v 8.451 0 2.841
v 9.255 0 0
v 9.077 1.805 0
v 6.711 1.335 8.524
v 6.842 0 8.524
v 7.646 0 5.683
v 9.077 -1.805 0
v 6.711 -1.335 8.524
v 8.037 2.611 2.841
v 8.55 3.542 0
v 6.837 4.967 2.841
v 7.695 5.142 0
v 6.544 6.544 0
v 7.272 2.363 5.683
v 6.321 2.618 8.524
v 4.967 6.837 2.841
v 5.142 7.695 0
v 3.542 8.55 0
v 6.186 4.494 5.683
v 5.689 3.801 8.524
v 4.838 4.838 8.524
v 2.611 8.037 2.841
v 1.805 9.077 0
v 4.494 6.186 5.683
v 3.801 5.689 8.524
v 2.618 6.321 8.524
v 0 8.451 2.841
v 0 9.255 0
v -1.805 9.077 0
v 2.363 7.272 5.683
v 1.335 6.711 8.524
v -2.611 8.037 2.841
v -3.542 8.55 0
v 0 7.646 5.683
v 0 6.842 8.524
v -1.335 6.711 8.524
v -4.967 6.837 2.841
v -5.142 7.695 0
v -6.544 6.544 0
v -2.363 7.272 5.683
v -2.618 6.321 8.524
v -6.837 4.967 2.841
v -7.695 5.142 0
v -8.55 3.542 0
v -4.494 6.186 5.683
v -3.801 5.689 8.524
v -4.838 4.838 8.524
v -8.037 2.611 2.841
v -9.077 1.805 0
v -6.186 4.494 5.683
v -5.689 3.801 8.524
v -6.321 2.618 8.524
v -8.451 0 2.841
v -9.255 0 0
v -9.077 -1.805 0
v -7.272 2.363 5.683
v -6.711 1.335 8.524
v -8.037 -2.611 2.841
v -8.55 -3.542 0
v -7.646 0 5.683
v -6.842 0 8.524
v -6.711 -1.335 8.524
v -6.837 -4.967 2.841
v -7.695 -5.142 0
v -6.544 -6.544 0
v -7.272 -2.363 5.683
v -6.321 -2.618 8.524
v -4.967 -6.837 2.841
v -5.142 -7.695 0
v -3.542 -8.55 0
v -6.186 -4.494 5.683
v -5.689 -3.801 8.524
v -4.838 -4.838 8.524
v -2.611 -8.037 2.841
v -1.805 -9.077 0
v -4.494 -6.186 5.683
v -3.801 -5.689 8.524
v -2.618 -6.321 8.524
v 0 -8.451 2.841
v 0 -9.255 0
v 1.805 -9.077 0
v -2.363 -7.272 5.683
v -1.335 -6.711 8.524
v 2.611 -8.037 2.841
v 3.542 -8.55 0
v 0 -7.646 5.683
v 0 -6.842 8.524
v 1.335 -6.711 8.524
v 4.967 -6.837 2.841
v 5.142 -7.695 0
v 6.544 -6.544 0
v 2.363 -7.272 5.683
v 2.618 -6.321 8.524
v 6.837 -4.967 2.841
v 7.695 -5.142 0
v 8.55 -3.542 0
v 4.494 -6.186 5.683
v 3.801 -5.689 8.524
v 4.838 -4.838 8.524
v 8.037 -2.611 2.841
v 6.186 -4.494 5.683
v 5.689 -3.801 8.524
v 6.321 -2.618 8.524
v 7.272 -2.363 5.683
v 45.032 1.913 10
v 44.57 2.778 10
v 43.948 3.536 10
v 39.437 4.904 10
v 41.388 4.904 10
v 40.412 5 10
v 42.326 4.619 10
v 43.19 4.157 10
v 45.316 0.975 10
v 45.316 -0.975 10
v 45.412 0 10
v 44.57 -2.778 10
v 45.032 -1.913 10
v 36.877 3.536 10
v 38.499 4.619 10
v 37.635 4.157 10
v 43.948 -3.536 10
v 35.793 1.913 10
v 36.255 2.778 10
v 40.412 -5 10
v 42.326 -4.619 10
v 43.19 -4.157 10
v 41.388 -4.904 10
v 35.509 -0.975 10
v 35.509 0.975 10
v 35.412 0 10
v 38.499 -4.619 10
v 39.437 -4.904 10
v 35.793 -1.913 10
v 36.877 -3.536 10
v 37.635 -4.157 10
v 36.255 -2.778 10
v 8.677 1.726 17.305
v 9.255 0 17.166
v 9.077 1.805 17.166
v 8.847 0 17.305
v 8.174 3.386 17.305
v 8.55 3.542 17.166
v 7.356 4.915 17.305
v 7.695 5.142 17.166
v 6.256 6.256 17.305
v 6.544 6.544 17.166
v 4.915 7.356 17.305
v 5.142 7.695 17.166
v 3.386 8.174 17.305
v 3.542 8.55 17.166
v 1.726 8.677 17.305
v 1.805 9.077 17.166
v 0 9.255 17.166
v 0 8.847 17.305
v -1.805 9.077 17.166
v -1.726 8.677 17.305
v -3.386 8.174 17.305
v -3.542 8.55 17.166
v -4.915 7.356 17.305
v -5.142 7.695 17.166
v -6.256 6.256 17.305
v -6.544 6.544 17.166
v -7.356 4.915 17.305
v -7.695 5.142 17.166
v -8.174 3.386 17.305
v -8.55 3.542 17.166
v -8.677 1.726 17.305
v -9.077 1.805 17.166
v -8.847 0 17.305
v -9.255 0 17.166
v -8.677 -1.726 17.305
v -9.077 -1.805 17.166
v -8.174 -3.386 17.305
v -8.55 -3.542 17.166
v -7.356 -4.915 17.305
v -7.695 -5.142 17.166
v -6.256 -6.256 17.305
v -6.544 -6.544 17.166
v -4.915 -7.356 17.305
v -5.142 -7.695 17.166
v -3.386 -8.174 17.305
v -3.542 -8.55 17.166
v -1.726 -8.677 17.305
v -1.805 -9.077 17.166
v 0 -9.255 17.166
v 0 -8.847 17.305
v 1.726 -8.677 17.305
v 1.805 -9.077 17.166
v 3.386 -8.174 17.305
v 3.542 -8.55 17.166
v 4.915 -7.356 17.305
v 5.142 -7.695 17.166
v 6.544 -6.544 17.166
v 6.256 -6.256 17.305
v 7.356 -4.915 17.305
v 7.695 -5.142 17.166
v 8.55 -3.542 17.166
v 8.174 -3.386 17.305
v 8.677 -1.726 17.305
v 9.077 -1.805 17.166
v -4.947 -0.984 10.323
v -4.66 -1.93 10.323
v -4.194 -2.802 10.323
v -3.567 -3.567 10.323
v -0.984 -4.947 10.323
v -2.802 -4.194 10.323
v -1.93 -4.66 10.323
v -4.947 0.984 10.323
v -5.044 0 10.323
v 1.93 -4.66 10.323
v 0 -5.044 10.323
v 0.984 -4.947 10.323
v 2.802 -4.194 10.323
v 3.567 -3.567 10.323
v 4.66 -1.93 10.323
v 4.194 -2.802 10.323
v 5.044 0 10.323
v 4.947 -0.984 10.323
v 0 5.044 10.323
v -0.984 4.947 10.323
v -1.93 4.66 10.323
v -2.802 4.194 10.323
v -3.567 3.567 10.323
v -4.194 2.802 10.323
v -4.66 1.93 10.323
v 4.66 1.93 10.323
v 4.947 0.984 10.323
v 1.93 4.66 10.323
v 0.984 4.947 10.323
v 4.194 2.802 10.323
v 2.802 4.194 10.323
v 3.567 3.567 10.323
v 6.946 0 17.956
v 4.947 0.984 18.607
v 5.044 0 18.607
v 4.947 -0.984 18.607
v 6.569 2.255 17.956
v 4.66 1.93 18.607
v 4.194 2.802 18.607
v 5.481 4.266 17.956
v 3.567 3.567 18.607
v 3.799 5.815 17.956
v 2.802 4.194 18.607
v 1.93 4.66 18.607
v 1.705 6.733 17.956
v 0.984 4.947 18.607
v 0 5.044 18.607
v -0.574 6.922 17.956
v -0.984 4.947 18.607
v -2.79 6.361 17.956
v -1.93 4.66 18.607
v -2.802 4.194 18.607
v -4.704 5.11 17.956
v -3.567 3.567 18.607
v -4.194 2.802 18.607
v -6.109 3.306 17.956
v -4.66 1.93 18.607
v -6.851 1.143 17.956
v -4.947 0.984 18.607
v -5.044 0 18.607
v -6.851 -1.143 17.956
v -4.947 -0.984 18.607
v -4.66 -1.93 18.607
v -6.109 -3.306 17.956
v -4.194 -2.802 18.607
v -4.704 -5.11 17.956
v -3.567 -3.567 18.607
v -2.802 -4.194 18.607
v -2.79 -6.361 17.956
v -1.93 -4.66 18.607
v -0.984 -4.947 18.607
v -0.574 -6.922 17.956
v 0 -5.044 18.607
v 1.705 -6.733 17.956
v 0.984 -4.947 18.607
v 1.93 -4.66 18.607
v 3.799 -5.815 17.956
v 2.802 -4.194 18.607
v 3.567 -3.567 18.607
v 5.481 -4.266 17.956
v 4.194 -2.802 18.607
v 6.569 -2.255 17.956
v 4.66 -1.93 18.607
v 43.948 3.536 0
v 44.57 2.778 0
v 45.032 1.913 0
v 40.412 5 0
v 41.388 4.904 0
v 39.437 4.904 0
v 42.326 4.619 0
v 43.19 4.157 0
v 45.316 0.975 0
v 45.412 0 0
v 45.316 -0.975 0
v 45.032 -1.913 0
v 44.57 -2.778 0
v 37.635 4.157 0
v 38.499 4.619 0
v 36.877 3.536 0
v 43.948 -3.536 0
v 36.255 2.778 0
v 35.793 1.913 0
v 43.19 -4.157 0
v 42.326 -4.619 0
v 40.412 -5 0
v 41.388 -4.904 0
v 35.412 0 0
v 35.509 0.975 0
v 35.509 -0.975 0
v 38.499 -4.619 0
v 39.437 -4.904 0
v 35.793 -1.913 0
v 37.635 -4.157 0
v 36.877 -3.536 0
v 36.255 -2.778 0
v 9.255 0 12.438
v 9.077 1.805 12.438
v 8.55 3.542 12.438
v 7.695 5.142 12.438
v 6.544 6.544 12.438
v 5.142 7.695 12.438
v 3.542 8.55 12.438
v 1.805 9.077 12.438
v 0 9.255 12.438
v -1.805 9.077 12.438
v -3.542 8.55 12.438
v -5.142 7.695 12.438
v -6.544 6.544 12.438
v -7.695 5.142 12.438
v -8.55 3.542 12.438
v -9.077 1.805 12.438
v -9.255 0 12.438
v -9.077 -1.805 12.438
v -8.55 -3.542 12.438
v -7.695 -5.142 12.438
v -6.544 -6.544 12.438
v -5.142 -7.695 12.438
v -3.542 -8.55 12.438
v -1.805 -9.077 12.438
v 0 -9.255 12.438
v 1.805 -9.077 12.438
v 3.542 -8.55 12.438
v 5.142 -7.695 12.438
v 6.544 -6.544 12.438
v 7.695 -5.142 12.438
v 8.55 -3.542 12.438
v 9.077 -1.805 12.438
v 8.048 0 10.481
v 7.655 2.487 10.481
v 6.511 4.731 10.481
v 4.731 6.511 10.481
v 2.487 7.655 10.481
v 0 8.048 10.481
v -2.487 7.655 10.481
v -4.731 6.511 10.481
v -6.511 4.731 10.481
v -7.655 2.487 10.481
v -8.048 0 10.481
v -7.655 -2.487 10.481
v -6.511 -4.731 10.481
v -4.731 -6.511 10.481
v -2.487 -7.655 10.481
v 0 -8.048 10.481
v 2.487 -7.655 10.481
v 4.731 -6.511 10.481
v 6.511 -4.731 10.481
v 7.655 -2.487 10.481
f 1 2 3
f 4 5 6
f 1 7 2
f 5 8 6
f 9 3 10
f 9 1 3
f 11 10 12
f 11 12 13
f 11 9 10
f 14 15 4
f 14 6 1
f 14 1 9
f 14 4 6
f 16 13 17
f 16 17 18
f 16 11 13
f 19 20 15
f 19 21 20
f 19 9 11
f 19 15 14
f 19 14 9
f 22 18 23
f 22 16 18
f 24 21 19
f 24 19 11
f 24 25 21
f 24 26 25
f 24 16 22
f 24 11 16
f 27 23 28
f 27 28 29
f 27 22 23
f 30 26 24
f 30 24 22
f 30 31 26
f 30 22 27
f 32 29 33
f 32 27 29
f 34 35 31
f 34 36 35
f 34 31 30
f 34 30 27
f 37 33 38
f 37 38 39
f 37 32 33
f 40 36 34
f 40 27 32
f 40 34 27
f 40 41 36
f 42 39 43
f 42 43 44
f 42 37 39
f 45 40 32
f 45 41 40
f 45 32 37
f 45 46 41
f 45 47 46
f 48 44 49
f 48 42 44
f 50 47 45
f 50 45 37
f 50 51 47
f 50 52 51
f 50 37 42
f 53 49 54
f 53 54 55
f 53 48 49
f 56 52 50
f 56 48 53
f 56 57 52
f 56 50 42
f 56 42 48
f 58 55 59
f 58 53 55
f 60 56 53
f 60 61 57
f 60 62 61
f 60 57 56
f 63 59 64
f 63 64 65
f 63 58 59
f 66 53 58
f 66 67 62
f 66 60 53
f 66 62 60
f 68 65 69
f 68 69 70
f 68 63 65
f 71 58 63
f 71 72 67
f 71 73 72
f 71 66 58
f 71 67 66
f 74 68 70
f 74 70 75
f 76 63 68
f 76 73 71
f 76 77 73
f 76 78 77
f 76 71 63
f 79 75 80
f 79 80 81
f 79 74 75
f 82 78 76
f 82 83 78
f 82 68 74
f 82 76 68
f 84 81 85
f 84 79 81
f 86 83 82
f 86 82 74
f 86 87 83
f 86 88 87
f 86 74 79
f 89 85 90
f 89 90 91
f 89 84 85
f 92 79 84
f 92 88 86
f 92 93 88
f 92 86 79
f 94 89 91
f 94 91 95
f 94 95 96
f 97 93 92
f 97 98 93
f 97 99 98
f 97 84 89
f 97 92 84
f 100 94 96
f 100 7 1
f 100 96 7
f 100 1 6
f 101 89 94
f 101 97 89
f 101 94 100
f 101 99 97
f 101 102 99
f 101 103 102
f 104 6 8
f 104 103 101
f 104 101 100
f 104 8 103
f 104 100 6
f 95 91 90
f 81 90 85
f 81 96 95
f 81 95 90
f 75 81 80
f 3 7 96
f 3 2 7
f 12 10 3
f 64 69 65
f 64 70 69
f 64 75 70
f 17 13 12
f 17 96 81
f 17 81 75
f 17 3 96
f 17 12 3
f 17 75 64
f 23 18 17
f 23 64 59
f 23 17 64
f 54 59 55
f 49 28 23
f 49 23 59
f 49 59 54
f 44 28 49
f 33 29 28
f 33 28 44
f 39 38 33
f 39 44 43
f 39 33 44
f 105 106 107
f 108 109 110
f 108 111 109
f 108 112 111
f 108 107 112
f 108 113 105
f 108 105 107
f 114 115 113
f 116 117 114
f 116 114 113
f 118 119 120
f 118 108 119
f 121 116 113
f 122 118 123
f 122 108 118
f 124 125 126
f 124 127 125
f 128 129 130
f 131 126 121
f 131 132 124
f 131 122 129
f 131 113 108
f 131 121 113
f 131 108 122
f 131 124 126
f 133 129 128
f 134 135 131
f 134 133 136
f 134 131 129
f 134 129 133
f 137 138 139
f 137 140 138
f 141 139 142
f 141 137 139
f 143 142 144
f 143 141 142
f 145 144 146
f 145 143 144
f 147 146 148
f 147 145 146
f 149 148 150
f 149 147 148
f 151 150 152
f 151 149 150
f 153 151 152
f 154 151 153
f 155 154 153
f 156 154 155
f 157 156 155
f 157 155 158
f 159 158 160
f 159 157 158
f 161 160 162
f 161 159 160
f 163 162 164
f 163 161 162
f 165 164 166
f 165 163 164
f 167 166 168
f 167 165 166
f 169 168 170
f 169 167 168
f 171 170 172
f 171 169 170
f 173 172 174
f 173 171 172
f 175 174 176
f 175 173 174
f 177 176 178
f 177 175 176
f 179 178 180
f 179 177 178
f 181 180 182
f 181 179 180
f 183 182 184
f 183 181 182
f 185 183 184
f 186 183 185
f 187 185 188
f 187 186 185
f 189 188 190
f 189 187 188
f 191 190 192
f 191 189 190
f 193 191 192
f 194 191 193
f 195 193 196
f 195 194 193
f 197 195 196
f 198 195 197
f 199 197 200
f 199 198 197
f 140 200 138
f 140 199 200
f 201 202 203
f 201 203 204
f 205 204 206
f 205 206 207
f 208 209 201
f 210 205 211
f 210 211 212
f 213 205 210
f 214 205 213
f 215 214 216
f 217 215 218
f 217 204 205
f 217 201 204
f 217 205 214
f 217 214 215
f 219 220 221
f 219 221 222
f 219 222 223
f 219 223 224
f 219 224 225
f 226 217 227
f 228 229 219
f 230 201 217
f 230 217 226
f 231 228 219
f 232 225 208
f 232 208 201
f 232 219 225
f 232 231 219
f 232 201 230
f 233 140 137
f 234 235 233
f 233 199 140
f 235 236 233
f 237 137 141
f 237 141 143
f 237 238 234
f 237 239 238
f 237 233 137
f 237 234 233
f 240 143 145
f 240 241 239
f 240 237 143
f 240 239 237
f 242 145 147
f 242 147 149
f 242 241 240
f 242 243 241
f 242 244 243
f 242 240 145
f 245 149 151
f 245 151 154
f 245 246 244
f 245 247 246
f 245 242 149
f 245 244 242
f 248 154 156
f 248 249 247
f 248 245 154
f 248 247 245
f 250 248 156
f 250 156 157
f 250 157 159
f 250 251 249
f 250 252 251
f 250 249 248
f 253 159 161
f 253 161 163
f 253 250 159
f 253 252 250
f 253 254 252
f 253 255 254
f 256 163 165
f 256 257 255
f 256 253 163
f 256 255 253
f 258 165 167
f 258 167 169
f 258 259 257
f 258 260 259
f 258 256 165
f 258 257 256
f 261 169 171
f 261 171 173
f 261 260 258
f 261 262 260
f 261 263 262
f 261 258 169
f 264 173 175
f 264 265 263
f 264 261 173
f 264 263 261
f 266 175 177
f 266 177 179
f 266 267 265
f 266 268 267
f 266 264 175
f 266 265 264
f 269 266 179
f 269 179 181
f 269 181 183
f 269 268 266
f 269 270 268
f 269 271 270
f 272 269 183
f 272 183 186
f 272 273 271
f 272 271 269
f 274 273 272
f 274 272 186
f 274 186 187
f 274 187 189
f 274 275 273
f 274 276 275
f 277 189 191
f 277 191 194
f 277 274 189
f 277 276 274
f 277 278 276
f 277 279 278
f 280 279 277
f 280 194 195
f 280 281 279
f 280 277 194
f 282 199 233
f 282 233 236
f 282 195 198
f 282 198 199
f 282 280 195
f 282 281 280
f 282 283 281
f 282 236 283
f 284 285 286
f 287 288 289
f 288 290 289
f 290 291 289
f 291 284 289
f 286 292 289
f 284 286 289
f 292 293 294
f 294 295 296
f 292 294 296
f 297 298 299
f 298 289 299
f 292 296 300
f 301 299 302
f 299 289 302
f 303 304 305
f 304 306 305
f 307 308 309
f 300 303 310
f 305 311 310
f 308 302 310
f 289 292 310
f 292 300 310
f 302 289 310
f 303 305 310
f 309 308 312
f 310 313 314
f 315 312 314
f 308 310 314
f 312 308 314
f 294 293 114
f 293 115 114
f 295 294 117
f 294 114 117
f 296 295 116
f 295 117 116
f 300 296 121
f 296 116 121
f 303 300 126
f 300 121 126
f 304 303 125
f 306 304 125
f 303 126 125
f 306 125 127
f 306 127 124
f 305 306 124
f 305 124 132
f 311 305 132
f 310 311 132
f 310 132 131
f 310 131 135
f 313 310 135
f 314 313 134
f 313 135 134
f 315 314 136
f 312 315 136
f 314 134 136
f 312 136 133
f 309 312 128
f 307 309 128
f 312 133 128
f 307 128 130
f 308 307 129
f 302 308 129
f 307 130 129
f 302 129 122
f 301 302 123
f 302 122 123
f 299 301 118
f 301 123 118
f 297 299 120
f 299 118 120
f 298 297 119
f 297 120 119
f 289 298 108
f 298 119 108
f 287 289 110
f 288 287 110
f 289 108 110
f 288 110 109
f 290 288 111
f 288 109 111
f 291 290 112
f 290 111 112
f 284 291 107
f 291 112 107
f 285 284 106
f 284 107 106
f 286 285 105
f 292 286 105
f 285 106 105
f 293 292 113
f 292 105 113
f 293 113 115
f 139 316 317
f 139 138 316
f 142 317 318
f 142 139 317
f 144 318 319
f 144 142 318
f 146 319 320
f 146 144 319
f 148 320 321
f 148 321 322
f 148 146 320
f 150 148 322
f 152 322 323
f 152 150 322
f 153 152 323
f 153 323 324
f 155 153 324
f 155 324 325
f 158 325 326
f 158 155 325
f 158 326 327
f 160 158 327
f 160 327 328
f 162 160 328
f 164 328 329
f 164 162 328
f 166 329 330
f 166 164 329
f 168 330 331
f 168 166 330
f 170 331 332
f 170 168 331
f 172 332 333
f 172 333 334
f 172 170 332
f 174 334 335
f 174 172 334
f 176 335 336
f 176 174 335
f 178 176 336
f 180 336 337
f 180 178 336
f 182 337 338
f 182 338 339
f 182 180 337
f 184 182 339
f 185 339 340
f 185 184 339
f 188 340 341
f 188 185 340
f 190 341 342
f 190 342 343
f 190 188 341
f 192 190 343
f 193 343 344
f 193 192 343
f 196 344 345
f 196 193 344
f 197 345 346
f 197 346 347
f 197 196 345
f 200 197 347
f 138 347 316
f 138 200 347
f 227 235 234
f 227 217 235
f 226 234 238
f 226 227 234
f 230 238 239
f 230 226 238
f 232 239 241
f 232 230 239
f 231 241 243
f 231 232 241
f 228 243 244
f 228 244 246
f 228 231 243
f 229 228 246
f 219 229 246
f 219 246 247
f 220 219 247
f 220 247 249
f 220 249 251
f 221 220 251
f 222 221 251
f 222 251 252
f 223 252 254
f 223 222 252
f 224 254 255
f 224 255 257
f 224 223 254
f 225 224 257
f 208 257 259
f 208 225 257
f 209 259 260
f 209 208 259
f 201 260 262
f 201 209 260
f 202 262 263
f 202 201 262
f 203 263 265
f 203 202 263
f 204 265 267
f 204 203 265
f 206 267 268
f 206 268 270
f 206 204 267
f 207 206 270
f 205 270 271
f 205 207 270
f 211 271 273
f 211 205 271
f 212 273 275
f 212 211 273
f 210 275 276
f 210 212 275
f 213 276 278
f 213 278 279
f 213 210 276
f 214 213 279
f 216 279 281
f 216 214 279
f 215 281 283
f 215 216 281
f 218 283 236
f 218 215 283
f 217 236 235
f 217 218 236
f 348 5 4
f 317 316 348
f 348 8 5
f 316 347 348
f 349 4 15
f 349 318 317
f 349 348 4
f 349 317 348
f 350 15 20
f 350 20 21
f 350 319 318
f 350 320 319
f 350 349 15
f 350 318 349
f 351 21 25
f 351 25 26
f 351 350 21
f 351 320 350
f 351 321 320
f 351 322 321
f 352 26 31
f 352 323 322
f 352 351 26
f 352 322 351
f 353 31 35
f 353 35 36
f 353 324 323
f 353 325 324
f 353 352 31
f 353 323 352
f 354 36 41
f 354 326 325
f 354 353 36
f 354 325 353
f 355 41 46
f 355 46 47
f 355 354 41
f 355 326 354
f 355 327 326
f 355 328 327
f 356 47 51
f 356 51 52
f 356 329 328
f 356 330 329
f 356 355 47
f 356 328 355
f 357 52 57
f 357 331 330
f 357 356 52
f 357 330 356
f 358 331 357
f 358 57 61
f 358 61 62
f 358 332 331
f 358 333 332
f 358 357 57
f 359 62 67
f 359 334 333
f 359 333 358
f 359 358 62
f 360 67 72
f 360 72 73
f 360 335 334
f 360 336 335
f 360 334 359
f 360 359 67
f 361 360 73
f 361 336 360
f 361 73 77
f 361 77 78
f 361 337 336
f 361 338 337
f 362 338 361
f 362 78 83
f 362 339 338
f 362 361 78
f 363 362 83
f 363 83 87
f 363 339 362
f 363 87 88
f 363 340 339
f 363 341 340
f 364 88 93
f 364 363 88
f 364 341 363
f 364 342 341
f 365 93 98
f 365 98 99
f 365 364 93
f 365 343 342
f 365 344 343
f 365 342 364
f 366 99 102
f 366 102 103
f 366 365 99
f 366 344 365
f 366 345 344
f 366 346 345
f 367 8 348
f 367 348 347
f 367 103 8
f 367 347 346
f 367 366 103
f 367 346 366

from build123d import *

# Parameters (mm, degrees)
F0_W = 5
F0_H = 10


# Not quite as in the source:
# - a feature names something its author has since deleted; it is built from what else it names


with BuildPart() as f1:
    # F0 (on Front) → F1 (revolve)
    with BuildSketch(Plane.XZ):
        Polygon((0, 10.3233849324), (0, 0), (9.254683698, 0), (6.8422881923, 8.5244880731), (9.254683698, 12.4379033223), (9.254683698, 14.0870045941), (9.254683698, 17.1659647299), (8.8474118947, 17.3053085763), (5.0441742836, 18.6065470946), (5.0441742836, 11.2733849324), (5.0441742836, 10.3233849324), align=None)
    revolve(axis=Axis((0, 0, 10.1661796476), (0, 0, 1)))


with BuildPart() as f2:
    # F0 (on Front) → F2 (revolve)
    with BuildSketch(Plane.XZ):
        with Locations((42.9124666942, 5)):
            Rectangle(F0_W, F0_H)
    revolve(axis=Axis((40.4124666942, 0, 5), (0, 0, -1)))


solid = Compound([f1.part, f2.part])
